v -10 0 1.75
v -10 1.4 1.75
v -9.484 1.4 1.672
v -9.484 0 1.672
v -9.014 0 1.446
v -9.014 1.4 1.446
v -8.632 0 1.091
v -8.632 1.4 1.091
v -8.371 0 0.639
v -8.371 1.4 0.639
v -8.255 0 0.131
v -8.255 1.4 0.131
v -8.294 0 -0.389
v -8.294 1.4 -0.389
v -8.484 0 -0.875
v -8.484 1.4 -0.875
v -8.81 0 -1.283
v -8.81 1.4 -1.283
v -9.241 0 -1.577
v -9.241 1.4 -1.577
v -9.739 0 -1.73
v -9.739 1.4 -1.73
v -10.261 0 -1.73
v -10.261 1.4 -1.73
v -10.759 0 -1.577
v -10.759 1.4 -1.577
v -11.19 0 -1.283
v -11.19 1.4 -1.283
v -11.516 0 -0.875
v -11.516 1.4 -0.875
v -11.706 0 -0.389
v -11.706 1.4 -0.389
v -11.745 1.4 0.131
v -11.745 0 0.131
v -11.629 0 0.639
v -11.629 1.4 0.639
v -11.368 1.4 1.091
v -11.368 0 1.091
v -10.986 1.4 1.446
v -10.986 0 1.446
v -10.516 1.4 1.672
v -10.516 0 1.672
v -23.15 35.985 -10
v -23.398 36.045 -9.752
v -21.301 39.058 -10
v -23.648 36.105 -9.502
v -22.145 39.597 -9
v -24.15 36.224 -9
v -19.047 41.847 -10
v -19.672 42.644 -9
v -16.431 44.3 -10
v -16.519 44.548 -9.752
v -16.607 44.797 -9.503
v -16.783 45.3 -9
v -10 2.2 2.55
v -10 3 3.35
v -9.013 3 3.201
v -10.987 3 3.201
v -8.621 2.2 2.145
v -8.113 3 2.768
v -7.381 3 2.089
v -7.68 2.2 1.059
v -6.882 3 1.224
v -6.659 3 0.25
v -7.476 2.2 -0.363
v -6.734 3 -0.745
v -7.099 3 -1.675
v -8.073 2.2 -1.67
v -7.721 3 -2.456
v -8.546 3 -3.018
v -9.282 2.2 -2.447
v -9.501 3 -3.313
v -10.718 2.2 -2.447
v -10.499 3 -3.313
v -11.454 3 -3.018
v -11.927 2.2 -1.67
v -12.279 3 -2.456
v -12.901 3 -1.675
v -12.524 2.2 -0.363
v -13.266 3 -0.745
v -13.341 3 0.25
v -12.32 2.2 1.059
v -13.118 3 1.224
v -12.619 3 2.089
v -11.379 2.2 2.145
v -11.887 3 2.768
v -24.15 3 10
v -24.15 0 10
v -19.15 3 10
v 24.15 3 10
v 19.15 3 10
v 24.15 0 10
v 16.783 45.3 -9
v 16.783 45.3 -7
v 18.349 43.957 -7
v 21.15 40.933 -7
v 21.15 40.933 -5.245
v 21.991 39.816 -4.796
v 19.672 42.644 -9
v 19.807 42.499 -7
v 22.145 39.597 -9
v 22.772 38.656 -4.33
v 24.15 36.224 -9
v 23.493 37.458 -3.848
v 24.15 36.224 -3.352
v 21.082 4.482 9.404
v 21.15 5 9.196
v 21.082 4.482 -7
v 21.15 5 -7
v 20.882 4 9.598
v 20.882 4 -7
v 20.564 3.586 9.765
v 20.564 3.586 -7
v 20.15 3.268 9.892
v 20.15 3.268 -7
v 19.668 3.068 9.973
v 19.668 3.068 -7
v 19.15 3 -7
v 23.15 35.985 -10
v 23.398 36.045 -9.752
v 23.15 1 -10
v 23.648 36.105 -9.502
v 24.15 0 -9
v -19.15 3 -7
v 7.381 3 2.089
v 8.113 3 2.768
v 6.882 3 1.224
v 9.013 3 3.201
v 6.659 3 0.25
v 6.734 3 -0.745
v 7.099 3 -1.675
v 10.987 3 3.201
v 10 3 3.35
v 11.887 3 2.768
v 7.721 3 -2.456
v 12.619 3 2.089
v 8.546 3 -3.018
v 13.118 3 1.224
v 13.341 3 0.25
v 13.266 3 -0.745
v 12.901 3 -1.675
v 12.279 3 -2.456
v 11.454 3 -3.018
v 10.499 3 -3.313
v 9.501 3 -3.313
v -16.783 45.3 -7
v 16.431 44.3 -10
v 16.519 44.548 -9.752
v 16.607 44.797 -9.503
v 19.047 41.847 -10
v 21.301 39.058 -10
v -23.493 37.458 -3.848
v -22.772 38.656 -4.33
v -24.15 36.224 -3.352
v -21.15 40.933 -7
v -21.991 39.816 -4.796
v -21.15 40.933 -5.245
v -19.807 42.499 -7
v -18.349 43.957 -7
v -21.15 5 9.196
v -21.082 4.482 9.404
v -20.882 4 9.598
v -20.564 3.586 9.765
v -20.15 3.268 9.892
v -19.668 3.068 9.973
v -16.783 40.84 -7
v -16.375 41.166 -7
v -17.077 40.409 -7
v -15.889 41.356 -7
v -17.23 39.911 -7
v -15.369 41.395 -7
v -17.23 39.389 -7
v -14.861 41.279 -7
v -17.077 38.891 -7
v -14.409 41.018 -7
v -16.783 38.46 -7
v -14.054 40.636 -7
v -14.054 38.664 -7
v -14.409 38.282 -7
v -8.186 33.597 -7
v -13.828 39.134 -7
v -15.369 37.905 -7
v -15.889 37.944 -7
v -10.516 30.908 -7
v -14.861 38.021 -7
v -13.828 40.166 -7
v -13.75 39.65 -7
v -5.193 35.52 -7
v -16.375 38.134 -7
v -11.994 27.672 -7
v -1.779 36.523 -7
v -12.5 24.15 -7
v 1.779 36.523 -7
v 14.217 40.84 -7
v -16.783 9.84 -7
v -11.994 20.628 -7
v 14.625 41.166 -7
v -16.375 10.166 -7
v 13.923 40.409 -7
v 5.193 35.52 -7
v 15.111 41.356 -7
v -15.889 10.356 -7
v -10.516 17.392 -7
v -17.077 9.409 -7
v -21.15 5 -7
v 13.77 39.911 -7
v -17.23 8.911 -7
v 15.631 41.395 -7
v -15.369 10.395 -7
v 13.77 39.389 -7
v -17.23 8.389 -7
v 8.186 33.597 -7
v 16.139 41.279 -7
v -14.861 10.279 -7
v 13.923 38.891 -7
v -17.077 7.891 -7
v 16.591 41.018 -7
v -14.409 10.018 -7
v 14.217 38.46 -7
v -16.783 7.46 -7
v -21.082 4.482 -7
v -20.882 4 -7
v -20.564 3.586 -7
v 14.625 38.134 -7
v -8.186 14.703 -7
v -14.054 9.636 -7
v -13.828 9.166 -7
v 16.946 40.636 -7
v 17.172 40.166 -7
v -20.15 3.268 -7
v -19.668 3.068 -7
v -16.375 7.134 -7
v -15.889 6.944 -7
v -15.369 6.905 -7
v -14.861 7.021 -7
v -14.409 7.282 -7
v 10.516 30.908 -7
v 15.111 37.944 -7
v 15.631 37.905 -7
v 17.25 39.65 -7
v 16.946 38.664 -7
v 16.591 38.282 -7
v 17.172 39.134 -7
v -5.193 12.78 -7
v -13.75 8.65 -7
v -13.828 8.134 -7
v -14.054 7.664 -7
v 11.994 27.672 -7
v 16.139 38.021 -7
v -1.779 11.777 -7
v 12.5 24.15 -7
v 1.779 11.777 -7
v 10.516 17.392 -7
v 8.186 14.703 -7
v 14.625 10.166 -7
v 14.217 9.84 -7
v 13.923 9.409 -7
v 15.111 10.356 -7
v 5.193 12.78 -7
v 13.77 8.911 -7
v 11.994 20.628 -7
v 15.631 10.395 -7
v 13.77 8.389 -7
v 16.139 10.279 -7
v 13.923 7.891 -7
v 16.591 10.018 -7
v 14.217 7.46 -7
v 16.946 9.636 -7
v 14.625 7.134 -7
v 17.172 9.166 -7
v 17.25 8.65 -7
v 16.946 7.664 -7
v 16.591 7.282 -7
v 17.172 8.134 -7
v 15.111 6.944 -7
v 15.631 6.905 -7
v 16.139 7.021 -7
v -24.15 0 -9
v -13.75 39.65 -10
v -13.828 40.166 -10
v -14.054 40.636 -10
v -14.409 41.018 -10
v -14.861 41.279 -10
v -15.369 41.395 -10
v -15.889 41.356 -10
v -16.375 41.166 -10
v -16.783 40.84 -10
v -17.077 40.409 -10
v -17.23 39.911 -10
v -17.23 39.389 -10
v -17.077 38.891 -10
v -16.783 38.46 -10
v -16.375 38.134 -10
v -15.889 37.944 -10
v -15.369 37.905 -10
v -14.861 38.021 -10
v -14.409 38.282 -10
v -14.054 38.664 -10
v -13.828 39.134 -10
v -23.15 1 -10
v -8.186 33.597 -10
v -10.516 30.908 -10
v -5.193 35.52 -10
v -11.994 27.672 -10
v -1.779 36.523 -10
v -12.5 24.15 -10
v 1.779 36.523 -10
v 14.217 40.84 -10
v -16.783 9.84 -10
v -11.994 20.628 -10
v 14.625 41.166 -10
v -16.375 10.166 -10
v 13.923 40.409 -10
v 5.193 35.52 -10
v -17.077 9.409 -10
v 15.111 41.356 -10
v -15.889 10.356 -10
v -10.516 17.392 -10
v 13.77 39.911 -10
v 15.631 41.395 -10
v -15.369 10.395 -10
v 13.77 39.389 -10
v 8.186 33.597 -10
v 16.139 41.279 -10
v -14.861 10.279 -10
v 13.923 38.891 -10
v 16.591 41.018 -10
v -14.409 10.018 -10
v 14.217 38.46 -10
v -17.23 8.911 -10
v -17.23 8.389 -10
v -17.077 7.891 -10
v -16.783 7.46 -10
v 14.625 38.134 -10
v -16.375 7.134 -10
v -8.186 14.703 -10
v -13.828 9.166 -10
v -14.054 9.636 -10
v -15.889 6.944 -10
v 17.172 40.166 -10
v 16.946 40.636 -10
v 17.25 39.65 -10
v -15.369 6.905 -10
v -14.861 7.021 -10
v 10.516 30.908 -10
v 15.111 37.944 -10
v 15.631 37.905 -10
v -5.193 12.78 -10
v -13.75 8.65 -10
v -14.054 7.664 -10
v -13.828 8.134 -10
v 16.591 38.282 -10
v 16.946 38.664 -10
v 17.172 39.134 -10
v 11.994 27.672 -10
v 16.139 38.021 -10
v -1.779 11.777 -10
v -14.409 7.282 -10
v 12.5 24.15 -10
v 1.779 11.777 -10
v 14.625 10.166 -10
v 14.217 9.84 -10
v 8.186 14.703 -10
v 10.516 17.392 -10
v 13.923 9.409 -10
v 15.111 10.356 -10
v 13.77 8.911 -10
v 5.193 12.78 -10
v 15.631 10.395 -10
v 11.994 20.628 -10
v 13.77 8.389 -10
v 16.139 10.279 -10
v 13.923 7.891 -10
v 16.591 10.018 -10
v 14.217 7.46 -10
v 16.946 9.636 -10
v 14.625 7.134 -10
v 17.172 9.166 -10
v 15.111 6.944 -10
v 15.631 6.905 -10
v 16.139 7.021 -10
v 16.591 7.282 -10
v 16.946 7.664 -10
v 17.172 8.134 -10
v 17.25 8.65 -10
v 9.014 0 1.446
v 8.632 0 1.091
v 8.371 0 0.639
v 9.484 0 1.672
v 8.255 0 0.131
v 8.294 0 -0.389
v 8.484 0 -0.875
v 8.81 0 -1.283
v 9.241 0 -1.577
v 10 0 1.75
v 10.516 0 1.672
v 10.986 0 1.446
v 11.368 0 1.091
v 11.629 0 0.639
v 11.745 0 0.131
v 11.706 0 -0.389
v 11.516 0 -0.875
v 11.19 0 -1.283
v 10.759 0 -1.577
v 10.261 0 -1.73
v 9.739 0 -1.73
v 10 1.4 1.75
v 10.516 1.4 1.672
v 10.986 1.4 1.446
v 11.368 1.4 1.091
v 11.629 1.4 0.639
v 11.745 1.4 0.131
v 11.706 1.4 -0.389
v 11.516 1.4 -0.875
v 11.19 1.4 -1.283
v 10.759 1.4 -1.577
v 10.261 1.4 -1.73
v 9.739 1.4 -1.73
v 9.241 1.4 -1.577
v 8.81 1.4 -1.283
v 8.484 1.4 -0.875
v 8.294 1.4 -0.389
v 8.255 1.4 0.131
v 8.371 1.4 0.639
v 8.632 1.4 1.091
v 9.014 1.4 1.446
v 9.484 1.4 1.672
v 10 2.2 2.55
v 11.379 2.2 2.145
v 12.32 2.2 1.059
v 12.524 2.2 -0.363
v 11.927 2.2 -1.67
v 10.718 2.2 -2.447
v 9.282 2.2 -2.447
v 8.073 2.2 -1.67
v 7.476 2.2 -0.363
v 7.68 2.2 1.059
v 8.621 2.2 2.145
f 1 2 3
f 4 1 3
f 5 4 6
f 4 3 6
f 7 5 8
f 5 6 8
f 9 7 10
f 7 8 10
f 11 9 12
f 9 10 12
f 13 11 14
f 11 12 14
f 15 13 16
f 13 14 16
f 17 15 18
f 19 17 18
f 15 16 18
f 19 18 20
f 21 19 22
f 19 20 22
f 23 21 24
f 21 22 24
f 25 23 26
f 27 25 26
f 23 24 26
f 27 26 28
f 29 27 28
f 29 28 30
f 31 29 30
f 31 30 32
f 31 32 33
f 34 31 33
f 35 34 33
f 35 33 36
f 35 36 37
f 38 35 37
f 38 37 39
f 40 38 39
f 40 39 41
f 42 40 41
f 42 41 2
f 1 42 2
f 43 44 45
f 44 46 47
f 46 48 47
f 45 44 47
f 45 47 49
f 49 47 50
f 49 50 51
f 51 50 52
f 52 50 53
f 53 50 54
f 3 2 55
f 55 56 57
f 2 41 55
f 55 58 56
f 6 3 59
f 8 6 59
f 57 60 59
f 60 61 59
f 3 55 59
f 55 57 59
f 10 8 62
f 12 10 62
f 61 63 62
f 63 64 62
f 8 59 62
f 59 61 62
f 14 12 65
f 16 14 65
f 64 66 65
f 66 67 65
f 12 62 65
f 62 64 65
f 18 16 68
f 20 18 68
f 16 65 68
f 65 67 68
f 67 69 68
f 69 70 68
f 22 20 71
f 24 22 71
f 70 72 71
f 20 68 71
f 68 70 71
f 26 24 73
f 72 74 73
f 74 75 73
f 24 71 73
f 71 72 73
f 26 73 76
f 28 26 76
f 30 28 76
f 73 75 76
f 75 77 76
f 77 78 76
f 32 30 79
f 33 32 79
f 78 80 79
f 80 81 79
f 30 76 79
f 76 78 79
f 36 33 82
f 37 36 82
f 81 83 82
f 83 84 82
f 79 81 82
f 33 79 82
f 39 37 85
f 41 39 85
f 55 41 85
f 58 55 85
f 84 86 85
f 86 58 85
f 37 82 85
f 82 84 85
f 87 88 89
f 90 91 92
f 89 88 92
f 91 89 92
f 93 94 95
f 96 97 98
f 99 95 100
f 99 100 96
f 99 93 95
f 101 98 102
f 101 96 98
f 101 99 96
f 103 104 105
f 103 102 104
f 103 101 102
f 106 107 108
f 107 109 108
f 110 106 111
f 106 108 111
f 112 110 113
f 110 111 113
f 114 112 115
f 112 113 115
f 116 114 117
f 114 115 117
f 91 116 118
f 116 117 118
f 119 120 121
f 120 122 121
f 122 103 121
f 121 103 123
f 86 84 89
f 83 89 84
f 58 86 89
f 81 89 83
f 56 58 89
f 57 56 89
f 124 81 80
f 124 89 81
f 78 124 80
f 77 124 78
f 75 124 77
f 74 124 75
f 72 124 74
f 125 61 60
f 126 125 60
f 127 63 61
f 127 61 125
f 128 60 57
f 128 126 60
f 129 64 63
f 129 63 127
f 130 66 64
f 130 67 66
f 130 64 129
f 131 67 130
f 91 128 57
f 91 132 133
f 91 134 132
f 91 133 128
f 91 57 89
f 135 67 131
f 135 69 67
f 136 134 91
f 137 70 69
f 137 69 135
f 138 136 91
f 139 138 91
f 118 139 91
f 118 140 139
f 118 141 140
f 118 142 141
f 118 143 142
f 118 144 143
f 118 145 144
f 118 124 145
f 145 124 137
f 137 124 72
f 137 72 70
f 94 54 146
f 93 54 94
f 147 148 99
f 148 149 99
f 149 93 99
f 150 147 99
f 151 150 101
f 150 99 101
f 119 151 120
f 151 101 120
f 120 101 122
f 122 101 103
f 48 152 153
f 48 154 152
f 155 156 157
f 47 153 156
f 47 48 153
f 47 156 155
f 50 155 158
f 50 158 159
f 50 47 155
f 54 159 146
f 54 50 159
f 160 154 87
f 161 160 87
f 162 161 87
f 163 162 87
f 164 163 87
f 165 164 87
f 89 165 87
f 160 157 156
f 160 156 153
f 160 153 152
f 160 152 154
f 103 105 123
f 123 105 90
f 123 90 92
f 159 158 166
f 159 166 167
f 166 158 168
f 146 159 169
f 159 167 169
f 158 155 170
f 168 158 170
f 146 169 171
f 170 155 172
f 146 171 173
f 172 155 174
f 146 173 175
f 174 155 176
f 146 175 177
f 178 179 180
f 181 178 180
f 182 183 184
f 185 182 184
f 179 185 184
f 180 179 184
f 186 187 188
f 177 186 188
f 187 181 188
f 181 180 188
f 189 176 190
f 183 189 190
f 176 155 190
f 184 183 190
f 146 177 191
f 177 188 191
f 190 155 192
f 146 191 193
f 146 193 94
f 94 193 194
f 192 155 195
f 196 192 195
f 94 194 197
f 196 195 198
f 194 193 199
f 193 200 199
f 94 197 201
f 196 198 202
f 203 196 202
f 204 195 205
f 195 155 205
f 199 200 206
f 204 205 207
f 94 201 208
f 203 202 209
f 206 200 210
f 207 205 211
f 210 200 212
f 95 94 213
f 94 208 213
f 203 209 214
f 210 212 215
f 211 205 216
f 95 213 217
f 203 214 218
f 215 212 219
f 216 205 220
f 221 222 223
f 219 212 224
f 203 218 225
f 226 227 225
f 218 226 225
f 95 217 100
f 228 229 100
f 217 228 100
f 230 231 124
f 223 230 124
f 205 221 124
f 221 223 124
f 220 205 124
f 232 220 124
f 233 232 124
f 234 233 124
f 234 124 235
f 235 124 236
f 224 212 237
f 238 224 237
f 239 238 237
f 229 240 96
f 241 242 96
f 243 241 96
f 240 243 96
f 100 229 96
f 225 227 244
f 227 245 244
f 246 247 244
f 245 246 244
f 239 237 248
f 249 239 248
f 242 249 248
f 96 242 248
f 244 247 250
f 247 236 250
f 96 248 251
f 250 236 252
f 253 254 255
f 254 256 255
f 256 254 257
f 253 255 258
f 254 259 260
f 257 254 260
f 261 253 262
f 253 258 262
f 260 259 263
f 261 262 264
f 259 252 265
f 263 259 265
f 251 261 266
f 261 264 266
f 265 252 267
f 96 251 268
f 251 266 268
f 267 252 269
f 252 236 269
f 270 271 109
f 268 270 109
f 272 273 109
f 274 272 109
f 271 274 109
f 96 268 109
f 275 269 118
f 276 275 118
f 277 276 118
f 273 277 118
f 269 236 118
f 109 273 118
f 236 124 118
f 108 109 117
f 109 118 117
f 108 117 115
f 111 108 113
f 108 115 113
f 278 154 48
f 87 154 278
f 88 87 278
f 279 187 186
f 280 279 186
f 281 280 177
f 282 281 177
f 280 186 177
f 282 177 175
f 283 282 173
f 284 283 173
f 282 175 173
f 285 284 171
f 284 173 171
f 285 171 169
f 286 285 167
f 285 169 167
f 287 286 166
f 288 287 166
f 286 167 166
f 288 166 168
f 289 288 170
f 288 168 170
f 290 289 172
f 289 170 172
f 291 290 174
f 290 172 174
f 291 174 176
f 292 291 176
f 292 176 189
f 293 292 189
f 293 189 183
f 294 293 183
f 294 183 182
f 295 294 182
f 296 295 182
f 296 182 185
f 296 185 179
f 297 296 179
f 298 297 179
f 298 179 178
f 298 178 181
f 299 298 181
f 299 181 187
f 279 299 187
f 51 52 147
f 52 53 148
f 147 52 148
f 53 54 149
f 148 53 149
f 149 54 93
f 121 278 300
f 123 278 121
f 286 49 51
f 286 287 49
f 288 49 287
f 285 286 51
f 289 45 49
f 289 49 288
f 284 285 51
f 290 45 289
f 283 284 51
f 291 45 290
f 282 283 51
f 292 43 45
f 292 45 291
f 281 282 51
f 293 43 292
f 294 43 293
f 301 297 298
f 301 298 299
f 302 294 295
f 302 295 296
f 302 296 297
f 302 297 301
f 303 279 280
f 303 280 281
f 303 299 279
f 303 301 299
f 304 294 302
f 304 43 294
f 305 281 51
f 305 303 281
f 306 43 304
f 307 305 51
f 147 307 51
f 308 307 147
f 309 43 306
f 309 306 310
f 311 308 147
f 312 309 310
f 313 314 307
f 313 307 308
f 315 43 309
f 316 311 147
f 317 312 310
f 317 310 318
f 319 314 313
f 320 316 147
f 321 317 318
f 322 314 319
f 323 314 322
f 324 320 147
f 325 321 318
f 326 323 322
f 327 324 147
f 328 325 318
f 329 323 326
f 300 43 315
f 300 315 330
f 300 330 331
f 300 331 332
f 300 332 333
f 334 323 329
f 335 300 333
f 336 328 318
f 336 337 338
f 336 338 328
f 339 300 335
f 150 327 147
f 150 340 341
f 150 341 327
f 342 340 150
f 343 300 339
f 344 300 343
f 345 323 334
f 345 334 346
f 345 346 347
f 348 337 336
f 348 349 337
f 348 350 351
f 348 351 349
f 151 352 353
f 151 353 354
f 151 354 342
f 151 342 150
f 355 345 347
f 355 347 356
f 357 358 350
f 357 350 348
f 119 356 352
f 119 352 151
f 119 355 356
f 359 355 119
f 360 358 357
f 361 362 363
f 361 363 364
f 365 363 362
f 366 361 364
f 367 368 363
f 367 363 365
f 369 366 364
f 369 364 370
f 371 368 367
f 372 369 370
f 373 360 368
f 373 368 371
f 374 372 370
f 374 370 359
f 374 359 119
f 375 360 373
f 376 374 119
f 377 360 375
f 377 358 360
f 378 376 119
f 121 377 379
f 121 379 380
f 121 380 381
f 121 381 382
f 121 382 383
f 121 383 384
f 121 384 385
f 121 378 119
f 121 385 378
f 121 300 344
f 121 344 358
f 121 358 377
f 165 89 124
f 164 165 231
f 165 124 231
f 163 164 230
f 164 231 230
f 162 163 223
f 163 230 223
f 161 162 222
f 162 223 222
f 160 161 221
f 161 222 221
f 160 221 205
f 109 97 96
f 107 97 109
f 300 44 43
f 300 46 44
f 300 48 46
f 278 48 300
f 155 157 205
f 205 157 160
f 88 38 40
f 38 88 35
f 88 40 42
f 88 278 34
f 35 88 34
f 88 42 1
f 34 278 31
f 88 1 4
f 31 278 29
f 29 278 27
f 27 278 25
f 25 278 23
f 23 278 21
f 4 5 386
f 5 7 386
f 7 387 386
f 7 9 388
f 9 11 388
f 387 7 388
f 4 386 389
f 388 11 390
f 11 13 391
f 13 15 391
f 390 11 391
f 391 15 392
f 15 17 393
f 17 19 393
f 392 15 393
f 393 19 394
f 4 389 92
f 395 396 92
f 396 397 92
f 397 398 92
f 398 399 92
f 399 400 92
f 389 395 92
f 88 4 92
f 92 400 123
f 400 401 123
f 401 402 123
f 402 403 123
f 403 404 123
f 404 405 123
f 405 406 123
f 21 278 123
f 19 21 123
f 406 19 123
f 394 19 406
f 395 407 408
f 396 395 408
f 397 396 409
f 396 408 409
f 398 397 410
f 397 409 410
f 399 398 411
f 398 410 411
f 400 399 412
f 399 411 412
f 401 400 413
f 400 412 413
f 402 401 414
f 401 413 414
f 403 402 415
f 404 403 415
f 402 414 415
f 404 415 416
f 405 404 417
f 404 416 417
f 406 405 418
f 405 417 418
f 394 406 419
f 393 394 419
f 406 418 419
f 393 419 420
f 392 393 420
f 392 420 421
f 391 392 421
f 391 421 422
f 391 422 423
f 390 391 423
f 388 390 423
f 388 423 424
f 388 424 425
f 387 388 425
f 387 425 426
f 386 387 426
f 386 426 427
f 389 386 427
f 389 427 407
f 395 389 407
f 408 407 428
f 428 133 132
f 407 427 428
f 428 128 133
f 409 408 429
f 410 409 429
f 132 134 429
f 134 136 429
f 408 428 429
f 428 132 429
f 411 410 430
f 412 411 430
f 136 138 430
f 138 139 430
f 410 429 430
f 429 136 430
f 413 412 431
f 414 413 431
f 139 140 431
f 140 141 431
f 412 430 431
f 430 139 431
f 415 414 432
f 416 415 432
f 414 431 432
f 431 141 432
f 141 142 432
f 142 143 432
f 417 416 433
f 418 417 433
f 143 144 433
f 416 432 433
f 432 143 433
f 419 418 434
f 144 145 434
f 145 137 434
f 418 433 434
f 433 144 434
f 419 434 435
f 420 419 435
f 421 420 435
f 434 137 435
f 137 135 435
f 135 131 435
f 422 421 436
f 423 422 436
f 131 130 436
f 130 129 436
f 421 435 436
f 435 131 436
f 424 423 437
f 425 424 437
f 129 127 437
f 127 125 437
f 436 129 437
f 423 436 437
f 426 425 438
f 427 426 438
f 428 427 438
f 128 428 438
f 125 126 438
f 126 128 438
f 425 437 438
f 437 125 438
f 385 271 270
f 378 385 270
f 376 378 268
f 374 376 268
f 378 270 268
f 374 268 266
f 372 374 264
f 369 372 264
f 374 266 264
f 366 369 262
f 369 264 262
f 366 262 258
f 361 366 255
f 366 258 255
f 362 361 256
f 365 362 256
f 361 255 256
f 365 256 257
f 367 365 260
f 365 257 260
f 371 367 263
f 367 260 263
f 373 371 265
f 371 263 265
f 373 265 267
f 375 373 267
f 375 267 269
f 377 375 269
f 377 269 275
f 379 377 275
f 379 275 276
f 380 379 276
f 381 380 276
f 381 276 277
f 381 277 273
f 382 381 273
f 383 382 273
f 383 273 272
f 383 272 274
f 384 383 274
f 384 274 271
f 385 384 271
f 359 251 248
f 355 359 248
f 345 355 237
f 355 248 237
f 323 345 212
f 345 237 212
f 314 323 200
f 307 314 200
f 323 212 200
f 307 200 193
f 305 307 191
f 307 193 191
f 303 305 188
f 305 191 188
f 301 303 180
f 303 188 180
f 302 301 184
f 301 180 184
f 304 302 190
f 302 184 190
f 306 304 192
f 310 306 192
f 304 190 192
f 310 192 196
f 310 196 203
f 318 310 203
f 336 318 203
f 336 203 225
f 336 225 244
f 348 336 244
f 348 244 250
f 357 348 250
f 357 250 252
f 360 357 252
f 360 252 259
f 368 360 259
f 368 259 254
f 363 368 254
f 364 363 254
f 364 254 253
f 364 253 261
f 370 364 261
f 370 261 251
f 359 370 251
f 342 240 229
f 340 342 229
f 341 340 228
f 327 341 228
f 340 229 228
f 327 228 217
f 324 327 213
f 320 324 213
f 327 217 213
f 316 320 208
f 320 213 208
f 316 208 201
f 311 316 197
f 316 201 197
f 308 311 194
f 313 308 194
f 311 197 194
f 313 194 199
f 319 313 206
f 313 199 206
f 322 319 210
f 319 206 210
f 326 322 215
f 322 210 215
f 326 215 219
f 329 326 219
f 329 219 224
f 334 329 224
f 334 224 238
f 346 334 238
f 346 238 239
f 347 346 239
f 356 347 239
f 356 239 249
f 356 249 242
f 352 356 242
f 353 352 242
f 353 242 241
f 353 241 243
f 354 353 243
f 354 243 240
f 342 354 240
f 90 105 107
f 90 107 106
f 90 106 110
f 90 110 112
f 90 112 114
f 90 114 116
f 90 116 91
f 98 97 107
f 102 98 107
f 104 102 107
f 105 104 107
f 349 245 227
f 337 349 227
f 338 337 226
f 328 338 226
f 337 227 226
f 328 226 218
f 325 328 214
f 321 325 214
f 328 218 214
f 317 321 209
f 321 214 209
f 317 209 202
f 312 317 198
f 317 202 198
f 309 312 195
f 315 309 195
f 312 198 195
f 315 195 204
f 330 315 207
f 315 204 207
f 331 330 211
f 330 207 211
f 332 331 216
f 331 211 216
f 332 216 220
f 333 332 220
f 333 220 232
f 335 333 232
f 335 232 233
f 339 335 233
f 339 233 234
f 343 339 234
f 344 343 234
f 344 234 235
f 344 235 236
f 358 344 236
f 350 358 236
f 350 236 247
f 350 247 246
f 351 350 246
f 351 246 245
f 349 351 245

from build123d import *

# Parameters (mm, degrees)
SKETCH1_W           = 48.3
SKETCH1_H           = 20
BOSS_EXTRUDE1_DEPTH = 3
SKETCH2_W           = 48.3
SKETCH2_H           = 3
BOSS_EXTRUDE2_DEPTH = 42.3
SKETCH3_R           = 12.5
SKETCH3_R_2         = 1.75
CUT_EXTRUDE1_DEPTH  = 55.076912819
RIB1_REACH          = 68.97
SKETCH4_WALL_W      = 181.528252596
SKETCH4_WALL_H      = 3
CUT_EXTRUDE2_DEPTH  = 56.093670235
SKETCH6_R           = 1.75
CUT_EXTRUDE3_DEPTH  = 50.724365255
FILLET1_R           = 2
CHAMFER2_SIZE       = 1
CHAMFER3_SIZE       = 1.6


with BuildPart() as part:
    # Sketch1 → Boss-Extrude1 (new body)
    with BuildSketch(Plane(origin=(0, 0, 0), x_dir=(1, 0, 0), z_dir=(0, 1, 0))):
        Rectangle(SKETCH1_W, SKETCH1_H)
    extrude(amount=BOSS_EXTRUDE1_DEPTH)

    # Sketch2 → Boss-Extrude2 (add)
    with BuildSketch(Plane(origin=(0, 3, 0), x_dir=(1, 0, 0), z_dir=(0, 1, 0))):
        with Locations((0, 8.5)):
            Rectangle(SKETCH2_W, SKETCH2_H)
    extrude(amount=BOSS_EXTRUDE2_DEPTH)

    # Sketch3 → Cut-Extrude1 (cut, through all)
    with BuildSketch(Plane.XY.offset(-7)):
        with Locations((0, 24.15)):
            Circle(SKETCH3_R)
        with Locations((-15.5, 39.65)):
            Circle(SKETCH3_R_2)
        with Locations((15.5, 39.65)):
            Circle(SKETCH3_R_2)
        with Locations((15.5, 8.65)):
            Circle(SKETCH3_R_2)
        with Locations((-15.5, 8.65)):
            Circle(SKETCH3_R_2)
    extrude(amount=-CUT_EXTRUDE1_DEPTH, mode=Mode.SUBTRACT)

    # Sketch4 wall → Rib1 (add, up to next)
    with BuildSketch(Plane(origin=(-24.15, 24.15, 1.5), x_dir=(0, -0.927870342081, 0.372902974359), z_dir=(0, 0.372902974359, 0.927870342081)), mode=Mode.PRIVATE) as rib1_sk1:
        with Locations((0, 1.5)):
            Rectangle(SKETCH4_WALL_W, SKETCH4_WALL_H)
    rib1_tool1 = extrude(rib1_sk1.sketch, amount=-RIB1_REACH, mode=Mode.PRIVATE) - part.part
    rib1 = rib1_tool1.solids().sort_by_distance((-24.15, 24.15, 1.5))[0]
    add(rib1)

    # Mirror1: Rib1 across plane
    add(rib1.mirror(Plane(origin=(0, 0, 0), x_dir=(0, 0, 1), z_dir=(1, 0, 0))))

    # Sketch5 → Cut-Extrude2 (cut, through all)
    with BuildSketch(Plane(origin=(0, 0, -10), x_dir=(-1, 0, 0), z_dir=(0, 0, -1))):
        with BuildLine():
            Line((-27, 24.15), (-32.102102735, 24.15))
            ThreePointArc((-32.102102735, 24.15), (0, 56.252102735), (32.102102735, 24.15))
            Line((32.102102735, 24.15), (27, 24.15))
            ThreePointArc((27, 24.15), (0, 51.15), (-27, 24.15))
        make_face()
    extrude(amount=-CUT_EXTRUDE2_DEPTH, mode=Mode.SUBTRACT)

    # Sketch6 → Cut-Extrude3 (cut, through all)
    with BuildSketch(Plane(origin=(0, 3, 0), x_dir=(1, 0, 0), z_dir=(0, 1, 0))):
        with Locations(Location((-10, 0, 0), (0, 0, 270))):
            Circle(SKETCH6_R)
        with Locations(Location((10, 0, 0), (0, 0, 270))):
            Circle(SKETCH6_R)
    extrude(amount=-CUT_EXTRUDE3_DEPTH, mode=Mode.SUBTRACT)

    # Fillet1
    fillet1_edges = [part.edges().sort_by_distance(p)[0] for p in [
        (-21.15, 3, 1.5),
        (21.15, 3, 1.5),
    ]]
    fillet(fillet1_edges, radius=FILLET1_R)

    # Chamfer2
    chamfer2_edges = [part.edges().sort_by_distance(p)[0] for p in [
        (0, 0, -10),
        (0, 45.3, -10),
        (-24.15, 18.111917674, -10),
        (24.15, 18.111917674, -10),
        (20.963705349, 41.165377106, -10),
        (-20.963705349, 41.165377106, -10),
    ]]
    chamfer(chamfer2_edges, length=CHAMFER2_SIZE)

    # Chamfer3
    chamfer3_edges = [part.edges().sort_by_distance(p)[0] for p in [
        (-10, 3, -1.75),
        (10, 3, -1.75),
    ]]
    chamfer(chamfer3_edges, length=CHAMFER3_SIZE)


solid = part.part
